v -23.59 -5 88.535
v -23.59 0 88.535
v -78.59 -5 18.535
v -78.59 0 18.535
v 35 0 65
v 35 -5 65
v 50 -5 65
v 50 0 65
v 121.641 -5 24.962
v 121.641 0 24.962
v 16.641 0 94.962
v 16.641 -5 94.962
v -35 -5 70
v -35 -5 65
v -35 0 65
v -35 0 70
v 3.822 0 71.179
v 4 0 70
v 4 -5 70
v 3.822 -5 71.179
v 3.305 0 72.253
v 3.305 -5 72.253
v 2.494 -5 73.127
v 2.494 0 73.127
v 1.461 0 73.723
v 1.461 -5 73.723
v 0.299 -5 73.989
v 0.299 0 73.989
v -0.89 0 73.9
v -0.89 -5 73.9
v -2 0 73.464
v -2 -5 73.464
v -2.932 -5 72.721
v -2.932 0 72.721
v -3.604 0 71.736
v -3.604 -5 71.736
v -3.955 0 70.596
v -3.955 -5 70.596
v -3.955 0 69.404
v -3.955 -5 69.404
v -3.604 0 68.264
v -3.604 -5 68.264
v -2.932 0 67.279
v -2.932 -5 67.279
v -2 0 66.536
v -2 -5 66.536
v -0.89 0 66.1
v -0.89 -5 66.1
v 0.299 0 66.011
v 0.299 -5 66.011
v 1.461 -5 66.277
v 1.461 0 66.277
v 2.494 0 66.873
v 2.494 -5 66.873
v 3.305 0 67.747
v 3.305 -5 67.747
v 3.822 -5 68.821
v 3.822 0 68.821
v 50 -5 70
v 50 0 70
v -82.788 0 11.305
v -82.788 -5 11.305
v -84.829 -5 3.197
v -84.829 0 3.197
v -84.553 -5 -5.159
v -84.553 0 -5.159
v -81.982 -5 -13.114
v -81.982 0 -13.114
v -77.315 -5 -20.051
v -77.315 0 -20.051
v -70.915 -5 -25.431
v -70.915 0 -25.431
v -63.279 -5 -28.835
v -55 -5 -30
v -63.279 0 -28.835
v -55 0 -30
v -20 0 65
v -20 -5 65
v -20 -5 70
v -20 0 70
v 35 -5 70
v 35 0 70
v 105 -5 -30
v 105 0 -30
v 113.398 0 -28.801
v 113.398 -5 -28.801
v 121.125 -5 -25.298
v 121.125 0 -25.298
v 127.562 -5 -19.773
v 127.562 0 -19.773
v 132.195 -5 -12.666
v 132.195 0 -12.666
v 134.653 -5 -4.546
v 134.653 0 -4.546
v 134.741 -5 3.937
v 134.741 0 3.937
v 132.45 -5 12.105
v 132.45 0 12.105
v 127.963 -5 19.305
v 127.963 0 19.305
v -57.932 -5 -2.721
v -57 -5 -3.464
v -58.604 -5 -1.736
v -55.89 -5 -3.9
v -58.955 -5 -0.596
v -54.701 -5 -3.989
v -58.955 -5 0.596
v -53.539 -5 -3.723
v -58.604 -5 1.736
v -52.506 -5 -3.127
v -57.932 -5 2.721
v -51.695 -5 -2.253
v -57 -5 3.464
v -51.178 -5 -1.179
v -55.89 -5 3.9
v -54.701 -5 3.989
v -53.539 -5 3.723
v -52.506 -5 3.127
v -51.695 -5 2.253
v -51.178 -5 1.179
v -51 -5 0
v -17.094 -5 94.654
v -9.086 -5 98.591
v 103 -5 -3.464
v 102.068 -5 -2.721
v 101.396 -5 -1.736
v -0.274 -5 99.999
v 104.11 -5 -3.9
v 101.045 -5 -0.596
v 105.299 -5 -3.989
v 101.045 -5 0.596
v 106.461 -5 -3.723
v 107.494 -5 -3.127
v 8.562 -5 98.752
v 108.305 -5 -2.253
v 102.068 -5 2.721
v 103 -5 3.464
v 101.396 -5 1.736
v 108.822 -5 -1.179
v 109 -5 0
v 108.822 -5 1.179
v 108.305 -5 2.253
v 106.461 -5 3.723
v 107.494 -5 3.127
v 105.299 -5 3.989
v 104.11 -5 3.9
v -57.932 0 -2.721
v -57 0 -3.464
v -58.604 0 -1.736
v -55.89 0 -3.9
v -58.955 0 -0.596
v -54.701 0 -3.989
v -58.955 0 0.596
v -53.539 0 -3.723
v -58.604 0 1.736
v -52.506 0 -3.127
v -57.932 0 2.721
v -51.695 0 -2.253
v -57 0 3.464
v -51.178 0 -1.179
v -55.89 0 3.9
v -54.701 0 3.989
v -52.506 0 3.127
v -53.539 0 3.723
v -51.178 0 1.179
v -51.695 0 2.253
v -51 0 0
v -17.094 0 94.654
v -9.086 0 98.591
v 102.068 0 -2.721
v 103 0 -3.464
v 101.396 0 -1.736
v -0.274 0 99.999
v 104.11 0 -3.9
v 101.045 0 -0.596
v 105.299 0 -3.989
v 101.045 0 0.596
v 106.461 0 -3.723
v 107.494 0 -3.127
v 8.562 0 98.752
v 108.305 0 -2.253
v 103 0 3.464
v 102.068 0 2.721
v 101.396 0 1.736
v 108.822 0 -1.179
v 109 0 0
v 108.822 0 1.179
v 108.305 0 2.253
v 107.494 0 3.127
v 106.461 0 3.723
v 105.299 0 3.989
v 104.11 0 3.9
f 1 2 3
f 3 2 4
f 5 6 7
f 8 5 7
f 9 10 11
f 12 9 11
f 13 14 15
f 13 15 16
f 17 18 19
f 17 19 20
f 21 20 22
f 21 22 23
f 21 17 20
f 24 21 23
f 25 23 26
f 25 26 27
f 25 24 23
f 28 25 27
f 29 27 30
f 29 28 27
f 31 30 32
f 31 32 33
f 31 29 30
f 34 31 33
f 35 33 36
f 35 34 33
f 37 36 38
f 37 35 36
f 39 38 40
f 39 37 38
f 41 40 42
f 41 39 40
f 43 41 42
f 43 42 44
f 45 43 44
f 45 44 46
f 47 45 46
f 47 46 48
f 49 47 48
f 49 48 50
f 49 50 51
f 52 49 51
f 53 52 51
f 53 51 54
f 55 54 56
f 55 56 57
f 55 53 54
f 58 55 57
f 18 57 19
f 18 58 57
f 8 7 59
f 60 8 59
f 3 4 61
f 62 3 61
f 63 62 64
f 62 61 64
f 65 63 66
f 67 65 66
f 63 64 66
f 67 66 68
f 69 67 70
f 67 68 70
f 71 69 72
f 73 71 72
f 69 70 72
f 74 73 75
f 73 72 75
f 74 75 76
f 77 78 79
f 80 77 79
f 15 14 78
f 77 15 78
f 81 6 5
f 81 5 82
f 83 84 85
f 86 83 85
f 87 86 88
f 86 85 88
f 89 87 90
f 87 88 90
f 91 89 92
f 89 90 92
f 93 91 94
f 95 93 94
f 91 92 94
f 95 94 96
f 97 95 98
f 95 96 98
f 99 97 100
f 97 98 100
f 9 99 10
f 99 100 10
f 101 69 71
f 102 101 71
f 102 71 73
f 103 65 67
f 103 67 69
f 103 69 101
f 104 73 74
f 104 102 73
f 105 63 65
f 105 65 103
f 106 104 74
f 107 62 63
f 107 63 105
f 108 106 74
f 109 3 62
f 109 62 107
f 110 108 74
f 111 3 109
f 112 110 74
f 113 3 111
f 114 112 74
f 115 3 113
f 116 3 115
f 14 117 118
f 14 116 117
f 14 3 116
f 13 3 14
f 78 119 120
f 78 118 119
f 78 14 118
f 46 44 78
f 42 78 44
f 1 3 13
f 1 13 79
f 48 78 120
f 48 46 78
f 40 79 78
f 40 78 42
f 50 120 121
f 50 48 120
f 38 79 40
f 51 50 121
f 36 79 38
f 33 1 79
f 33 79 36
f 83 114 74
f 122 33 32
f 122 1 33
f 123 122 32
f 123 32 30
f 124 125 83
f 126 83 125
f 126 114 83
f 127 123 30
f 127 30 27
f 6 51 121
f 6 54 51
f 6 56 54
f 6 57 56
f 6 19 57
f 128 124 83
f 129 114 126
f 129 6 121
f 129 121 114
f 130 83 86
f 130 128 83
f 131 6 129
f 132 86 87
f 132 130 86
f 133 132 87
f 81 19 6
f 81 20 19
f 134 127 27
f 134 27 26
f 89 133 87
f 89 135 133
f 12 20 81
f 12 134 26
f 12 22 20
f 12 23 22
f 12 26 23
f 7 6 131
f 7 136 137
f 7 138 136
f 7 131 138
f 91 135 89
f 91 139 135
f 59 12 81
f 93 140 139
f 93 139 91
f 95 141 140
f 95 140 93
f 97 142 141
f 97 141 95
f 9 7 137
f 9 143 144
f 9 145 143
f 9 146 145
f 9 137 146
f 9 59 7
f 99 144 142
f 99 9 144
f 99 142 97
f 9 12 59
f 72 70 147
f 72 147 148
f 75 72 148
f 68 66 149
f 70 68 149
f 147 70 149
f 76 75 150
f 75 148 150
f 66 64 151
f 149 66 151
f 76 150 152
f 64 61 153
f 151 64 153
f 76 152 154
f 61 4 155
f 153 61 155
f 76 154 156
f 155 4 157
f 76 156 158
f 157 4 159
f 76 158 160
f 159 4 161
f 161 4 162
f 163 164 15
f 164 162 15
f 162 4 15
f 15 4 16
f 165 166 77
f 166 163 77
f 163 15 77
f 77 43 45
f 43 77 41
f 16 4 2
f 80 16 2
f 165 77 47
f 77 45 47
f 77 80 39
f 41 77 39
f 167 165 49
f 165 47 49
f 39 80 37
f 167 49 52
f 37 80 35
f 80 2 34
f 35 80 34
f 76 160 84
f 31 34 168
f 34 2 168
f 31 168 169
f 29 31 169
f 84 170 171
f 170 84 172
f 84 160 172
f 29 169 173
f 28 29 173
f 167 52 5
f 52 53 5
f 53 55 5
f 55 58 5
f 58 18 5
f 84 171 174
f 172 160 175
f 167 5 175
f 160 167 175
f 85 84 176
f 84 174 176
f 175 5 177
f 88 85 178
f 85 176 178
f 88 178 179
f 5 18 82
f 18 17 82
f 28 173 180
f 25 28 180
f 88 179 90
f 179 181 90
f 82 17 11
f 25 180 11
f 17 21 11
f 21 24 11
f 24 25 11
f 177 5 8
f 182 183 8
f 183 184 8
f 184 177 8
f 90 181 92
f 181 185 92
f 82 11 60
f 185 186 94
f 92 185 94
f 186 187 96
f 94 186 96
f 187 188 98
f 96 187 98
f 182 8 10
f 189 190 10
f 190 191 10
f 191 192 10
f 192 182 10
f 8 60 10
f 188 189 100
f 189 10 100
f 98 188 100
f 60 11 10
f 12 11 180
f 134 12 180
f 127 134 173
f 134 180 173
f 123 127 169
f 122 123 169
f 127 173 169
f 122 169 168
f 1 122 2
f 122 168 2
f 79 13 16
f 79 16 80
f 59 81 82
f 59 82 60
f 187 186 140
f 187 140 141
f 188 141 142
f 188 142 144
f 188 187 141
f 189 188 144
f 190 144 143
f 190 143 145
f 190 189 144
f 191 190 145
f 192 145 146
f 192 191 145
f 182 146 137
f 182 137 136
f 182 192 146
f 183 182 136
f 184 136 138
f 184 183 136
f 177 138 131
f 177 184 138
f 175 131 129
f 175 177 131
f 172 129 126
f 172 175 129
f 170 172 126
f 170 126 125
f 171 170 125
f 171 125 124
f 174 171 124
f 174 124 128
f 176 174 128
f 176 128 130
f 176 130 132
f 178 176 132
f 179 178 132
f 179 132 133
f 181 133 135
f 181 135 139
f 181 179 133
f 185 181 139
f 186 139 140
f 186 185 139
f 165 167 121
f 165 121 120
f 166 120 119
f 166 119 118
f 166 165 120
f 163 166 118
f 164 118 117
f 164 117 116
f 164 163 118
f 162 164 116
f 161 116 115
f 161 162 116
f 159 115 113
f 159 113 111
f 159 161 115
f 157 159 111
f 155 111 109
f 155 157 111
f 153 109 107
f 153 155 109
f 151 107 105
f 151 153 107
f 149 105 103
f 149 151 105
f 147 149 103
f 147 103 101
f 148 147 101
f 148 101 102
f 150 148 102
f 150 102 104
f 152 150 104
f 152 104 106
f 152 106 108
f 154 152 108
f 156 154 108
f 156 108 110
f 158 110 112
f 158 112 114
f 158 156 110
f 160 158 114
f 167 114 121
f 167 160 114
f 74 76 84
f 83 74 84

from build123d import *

# Parameters (mm, degrees)
F0_R     = 4
F1_DEPTH = 5
F2_W     = 15
F2_H     = 5
F3_DEPTH = 5


with BuildPart() as f1:
    # F0 (on Front) → F1 (new body)
    with BuildSketch(Plane.XZ):
        with BuildLine():
            Line((-23.58955, 88.534647), (-78.58955, 18.534647))
            ThreePointArc((-78.58955, 18.534647), (-81.98184, -13.114126), (-55, -30))
            Line((-55, -30), (105, -30))
            ThreePointArc((105, -30), (133.712761, -8.693524), (121.641006, 24.961509))
            Line((121.641006, 24.961509), (16.641006, 94.961509))
            ThreePointArc((16.641006, 94.961509), (-4.732516, 99.62437), (-23.58955, 88.534647))
        make_face()
        with Locations((-55, 0)):
            Circle(F0_R, mode=Mode.SUBTRACT)
        with Locations((105, 0)):
            Circle(F0_R, mode=Mode.SUBTRACT)
        with Locations((0, 70)):
            Circle(F0_R, mode=Mode.SUBTRACT)
    extrude(amount=F1_DEPTH)

    # F2 (on face) → F3 (cut)
    with BuildSketch(Plane.XZ.offset(5)):
        with Locations((-27.5, 67.5)):
            Rectangle(F2_W, F2_H)
        with Locations((42.5, 67.5)):
            Rectangle(F2_W, F2_H)
    extrude(amount=-F3_DEPTH, mode=Mode.SUBTRACT)


solid = f1.part
